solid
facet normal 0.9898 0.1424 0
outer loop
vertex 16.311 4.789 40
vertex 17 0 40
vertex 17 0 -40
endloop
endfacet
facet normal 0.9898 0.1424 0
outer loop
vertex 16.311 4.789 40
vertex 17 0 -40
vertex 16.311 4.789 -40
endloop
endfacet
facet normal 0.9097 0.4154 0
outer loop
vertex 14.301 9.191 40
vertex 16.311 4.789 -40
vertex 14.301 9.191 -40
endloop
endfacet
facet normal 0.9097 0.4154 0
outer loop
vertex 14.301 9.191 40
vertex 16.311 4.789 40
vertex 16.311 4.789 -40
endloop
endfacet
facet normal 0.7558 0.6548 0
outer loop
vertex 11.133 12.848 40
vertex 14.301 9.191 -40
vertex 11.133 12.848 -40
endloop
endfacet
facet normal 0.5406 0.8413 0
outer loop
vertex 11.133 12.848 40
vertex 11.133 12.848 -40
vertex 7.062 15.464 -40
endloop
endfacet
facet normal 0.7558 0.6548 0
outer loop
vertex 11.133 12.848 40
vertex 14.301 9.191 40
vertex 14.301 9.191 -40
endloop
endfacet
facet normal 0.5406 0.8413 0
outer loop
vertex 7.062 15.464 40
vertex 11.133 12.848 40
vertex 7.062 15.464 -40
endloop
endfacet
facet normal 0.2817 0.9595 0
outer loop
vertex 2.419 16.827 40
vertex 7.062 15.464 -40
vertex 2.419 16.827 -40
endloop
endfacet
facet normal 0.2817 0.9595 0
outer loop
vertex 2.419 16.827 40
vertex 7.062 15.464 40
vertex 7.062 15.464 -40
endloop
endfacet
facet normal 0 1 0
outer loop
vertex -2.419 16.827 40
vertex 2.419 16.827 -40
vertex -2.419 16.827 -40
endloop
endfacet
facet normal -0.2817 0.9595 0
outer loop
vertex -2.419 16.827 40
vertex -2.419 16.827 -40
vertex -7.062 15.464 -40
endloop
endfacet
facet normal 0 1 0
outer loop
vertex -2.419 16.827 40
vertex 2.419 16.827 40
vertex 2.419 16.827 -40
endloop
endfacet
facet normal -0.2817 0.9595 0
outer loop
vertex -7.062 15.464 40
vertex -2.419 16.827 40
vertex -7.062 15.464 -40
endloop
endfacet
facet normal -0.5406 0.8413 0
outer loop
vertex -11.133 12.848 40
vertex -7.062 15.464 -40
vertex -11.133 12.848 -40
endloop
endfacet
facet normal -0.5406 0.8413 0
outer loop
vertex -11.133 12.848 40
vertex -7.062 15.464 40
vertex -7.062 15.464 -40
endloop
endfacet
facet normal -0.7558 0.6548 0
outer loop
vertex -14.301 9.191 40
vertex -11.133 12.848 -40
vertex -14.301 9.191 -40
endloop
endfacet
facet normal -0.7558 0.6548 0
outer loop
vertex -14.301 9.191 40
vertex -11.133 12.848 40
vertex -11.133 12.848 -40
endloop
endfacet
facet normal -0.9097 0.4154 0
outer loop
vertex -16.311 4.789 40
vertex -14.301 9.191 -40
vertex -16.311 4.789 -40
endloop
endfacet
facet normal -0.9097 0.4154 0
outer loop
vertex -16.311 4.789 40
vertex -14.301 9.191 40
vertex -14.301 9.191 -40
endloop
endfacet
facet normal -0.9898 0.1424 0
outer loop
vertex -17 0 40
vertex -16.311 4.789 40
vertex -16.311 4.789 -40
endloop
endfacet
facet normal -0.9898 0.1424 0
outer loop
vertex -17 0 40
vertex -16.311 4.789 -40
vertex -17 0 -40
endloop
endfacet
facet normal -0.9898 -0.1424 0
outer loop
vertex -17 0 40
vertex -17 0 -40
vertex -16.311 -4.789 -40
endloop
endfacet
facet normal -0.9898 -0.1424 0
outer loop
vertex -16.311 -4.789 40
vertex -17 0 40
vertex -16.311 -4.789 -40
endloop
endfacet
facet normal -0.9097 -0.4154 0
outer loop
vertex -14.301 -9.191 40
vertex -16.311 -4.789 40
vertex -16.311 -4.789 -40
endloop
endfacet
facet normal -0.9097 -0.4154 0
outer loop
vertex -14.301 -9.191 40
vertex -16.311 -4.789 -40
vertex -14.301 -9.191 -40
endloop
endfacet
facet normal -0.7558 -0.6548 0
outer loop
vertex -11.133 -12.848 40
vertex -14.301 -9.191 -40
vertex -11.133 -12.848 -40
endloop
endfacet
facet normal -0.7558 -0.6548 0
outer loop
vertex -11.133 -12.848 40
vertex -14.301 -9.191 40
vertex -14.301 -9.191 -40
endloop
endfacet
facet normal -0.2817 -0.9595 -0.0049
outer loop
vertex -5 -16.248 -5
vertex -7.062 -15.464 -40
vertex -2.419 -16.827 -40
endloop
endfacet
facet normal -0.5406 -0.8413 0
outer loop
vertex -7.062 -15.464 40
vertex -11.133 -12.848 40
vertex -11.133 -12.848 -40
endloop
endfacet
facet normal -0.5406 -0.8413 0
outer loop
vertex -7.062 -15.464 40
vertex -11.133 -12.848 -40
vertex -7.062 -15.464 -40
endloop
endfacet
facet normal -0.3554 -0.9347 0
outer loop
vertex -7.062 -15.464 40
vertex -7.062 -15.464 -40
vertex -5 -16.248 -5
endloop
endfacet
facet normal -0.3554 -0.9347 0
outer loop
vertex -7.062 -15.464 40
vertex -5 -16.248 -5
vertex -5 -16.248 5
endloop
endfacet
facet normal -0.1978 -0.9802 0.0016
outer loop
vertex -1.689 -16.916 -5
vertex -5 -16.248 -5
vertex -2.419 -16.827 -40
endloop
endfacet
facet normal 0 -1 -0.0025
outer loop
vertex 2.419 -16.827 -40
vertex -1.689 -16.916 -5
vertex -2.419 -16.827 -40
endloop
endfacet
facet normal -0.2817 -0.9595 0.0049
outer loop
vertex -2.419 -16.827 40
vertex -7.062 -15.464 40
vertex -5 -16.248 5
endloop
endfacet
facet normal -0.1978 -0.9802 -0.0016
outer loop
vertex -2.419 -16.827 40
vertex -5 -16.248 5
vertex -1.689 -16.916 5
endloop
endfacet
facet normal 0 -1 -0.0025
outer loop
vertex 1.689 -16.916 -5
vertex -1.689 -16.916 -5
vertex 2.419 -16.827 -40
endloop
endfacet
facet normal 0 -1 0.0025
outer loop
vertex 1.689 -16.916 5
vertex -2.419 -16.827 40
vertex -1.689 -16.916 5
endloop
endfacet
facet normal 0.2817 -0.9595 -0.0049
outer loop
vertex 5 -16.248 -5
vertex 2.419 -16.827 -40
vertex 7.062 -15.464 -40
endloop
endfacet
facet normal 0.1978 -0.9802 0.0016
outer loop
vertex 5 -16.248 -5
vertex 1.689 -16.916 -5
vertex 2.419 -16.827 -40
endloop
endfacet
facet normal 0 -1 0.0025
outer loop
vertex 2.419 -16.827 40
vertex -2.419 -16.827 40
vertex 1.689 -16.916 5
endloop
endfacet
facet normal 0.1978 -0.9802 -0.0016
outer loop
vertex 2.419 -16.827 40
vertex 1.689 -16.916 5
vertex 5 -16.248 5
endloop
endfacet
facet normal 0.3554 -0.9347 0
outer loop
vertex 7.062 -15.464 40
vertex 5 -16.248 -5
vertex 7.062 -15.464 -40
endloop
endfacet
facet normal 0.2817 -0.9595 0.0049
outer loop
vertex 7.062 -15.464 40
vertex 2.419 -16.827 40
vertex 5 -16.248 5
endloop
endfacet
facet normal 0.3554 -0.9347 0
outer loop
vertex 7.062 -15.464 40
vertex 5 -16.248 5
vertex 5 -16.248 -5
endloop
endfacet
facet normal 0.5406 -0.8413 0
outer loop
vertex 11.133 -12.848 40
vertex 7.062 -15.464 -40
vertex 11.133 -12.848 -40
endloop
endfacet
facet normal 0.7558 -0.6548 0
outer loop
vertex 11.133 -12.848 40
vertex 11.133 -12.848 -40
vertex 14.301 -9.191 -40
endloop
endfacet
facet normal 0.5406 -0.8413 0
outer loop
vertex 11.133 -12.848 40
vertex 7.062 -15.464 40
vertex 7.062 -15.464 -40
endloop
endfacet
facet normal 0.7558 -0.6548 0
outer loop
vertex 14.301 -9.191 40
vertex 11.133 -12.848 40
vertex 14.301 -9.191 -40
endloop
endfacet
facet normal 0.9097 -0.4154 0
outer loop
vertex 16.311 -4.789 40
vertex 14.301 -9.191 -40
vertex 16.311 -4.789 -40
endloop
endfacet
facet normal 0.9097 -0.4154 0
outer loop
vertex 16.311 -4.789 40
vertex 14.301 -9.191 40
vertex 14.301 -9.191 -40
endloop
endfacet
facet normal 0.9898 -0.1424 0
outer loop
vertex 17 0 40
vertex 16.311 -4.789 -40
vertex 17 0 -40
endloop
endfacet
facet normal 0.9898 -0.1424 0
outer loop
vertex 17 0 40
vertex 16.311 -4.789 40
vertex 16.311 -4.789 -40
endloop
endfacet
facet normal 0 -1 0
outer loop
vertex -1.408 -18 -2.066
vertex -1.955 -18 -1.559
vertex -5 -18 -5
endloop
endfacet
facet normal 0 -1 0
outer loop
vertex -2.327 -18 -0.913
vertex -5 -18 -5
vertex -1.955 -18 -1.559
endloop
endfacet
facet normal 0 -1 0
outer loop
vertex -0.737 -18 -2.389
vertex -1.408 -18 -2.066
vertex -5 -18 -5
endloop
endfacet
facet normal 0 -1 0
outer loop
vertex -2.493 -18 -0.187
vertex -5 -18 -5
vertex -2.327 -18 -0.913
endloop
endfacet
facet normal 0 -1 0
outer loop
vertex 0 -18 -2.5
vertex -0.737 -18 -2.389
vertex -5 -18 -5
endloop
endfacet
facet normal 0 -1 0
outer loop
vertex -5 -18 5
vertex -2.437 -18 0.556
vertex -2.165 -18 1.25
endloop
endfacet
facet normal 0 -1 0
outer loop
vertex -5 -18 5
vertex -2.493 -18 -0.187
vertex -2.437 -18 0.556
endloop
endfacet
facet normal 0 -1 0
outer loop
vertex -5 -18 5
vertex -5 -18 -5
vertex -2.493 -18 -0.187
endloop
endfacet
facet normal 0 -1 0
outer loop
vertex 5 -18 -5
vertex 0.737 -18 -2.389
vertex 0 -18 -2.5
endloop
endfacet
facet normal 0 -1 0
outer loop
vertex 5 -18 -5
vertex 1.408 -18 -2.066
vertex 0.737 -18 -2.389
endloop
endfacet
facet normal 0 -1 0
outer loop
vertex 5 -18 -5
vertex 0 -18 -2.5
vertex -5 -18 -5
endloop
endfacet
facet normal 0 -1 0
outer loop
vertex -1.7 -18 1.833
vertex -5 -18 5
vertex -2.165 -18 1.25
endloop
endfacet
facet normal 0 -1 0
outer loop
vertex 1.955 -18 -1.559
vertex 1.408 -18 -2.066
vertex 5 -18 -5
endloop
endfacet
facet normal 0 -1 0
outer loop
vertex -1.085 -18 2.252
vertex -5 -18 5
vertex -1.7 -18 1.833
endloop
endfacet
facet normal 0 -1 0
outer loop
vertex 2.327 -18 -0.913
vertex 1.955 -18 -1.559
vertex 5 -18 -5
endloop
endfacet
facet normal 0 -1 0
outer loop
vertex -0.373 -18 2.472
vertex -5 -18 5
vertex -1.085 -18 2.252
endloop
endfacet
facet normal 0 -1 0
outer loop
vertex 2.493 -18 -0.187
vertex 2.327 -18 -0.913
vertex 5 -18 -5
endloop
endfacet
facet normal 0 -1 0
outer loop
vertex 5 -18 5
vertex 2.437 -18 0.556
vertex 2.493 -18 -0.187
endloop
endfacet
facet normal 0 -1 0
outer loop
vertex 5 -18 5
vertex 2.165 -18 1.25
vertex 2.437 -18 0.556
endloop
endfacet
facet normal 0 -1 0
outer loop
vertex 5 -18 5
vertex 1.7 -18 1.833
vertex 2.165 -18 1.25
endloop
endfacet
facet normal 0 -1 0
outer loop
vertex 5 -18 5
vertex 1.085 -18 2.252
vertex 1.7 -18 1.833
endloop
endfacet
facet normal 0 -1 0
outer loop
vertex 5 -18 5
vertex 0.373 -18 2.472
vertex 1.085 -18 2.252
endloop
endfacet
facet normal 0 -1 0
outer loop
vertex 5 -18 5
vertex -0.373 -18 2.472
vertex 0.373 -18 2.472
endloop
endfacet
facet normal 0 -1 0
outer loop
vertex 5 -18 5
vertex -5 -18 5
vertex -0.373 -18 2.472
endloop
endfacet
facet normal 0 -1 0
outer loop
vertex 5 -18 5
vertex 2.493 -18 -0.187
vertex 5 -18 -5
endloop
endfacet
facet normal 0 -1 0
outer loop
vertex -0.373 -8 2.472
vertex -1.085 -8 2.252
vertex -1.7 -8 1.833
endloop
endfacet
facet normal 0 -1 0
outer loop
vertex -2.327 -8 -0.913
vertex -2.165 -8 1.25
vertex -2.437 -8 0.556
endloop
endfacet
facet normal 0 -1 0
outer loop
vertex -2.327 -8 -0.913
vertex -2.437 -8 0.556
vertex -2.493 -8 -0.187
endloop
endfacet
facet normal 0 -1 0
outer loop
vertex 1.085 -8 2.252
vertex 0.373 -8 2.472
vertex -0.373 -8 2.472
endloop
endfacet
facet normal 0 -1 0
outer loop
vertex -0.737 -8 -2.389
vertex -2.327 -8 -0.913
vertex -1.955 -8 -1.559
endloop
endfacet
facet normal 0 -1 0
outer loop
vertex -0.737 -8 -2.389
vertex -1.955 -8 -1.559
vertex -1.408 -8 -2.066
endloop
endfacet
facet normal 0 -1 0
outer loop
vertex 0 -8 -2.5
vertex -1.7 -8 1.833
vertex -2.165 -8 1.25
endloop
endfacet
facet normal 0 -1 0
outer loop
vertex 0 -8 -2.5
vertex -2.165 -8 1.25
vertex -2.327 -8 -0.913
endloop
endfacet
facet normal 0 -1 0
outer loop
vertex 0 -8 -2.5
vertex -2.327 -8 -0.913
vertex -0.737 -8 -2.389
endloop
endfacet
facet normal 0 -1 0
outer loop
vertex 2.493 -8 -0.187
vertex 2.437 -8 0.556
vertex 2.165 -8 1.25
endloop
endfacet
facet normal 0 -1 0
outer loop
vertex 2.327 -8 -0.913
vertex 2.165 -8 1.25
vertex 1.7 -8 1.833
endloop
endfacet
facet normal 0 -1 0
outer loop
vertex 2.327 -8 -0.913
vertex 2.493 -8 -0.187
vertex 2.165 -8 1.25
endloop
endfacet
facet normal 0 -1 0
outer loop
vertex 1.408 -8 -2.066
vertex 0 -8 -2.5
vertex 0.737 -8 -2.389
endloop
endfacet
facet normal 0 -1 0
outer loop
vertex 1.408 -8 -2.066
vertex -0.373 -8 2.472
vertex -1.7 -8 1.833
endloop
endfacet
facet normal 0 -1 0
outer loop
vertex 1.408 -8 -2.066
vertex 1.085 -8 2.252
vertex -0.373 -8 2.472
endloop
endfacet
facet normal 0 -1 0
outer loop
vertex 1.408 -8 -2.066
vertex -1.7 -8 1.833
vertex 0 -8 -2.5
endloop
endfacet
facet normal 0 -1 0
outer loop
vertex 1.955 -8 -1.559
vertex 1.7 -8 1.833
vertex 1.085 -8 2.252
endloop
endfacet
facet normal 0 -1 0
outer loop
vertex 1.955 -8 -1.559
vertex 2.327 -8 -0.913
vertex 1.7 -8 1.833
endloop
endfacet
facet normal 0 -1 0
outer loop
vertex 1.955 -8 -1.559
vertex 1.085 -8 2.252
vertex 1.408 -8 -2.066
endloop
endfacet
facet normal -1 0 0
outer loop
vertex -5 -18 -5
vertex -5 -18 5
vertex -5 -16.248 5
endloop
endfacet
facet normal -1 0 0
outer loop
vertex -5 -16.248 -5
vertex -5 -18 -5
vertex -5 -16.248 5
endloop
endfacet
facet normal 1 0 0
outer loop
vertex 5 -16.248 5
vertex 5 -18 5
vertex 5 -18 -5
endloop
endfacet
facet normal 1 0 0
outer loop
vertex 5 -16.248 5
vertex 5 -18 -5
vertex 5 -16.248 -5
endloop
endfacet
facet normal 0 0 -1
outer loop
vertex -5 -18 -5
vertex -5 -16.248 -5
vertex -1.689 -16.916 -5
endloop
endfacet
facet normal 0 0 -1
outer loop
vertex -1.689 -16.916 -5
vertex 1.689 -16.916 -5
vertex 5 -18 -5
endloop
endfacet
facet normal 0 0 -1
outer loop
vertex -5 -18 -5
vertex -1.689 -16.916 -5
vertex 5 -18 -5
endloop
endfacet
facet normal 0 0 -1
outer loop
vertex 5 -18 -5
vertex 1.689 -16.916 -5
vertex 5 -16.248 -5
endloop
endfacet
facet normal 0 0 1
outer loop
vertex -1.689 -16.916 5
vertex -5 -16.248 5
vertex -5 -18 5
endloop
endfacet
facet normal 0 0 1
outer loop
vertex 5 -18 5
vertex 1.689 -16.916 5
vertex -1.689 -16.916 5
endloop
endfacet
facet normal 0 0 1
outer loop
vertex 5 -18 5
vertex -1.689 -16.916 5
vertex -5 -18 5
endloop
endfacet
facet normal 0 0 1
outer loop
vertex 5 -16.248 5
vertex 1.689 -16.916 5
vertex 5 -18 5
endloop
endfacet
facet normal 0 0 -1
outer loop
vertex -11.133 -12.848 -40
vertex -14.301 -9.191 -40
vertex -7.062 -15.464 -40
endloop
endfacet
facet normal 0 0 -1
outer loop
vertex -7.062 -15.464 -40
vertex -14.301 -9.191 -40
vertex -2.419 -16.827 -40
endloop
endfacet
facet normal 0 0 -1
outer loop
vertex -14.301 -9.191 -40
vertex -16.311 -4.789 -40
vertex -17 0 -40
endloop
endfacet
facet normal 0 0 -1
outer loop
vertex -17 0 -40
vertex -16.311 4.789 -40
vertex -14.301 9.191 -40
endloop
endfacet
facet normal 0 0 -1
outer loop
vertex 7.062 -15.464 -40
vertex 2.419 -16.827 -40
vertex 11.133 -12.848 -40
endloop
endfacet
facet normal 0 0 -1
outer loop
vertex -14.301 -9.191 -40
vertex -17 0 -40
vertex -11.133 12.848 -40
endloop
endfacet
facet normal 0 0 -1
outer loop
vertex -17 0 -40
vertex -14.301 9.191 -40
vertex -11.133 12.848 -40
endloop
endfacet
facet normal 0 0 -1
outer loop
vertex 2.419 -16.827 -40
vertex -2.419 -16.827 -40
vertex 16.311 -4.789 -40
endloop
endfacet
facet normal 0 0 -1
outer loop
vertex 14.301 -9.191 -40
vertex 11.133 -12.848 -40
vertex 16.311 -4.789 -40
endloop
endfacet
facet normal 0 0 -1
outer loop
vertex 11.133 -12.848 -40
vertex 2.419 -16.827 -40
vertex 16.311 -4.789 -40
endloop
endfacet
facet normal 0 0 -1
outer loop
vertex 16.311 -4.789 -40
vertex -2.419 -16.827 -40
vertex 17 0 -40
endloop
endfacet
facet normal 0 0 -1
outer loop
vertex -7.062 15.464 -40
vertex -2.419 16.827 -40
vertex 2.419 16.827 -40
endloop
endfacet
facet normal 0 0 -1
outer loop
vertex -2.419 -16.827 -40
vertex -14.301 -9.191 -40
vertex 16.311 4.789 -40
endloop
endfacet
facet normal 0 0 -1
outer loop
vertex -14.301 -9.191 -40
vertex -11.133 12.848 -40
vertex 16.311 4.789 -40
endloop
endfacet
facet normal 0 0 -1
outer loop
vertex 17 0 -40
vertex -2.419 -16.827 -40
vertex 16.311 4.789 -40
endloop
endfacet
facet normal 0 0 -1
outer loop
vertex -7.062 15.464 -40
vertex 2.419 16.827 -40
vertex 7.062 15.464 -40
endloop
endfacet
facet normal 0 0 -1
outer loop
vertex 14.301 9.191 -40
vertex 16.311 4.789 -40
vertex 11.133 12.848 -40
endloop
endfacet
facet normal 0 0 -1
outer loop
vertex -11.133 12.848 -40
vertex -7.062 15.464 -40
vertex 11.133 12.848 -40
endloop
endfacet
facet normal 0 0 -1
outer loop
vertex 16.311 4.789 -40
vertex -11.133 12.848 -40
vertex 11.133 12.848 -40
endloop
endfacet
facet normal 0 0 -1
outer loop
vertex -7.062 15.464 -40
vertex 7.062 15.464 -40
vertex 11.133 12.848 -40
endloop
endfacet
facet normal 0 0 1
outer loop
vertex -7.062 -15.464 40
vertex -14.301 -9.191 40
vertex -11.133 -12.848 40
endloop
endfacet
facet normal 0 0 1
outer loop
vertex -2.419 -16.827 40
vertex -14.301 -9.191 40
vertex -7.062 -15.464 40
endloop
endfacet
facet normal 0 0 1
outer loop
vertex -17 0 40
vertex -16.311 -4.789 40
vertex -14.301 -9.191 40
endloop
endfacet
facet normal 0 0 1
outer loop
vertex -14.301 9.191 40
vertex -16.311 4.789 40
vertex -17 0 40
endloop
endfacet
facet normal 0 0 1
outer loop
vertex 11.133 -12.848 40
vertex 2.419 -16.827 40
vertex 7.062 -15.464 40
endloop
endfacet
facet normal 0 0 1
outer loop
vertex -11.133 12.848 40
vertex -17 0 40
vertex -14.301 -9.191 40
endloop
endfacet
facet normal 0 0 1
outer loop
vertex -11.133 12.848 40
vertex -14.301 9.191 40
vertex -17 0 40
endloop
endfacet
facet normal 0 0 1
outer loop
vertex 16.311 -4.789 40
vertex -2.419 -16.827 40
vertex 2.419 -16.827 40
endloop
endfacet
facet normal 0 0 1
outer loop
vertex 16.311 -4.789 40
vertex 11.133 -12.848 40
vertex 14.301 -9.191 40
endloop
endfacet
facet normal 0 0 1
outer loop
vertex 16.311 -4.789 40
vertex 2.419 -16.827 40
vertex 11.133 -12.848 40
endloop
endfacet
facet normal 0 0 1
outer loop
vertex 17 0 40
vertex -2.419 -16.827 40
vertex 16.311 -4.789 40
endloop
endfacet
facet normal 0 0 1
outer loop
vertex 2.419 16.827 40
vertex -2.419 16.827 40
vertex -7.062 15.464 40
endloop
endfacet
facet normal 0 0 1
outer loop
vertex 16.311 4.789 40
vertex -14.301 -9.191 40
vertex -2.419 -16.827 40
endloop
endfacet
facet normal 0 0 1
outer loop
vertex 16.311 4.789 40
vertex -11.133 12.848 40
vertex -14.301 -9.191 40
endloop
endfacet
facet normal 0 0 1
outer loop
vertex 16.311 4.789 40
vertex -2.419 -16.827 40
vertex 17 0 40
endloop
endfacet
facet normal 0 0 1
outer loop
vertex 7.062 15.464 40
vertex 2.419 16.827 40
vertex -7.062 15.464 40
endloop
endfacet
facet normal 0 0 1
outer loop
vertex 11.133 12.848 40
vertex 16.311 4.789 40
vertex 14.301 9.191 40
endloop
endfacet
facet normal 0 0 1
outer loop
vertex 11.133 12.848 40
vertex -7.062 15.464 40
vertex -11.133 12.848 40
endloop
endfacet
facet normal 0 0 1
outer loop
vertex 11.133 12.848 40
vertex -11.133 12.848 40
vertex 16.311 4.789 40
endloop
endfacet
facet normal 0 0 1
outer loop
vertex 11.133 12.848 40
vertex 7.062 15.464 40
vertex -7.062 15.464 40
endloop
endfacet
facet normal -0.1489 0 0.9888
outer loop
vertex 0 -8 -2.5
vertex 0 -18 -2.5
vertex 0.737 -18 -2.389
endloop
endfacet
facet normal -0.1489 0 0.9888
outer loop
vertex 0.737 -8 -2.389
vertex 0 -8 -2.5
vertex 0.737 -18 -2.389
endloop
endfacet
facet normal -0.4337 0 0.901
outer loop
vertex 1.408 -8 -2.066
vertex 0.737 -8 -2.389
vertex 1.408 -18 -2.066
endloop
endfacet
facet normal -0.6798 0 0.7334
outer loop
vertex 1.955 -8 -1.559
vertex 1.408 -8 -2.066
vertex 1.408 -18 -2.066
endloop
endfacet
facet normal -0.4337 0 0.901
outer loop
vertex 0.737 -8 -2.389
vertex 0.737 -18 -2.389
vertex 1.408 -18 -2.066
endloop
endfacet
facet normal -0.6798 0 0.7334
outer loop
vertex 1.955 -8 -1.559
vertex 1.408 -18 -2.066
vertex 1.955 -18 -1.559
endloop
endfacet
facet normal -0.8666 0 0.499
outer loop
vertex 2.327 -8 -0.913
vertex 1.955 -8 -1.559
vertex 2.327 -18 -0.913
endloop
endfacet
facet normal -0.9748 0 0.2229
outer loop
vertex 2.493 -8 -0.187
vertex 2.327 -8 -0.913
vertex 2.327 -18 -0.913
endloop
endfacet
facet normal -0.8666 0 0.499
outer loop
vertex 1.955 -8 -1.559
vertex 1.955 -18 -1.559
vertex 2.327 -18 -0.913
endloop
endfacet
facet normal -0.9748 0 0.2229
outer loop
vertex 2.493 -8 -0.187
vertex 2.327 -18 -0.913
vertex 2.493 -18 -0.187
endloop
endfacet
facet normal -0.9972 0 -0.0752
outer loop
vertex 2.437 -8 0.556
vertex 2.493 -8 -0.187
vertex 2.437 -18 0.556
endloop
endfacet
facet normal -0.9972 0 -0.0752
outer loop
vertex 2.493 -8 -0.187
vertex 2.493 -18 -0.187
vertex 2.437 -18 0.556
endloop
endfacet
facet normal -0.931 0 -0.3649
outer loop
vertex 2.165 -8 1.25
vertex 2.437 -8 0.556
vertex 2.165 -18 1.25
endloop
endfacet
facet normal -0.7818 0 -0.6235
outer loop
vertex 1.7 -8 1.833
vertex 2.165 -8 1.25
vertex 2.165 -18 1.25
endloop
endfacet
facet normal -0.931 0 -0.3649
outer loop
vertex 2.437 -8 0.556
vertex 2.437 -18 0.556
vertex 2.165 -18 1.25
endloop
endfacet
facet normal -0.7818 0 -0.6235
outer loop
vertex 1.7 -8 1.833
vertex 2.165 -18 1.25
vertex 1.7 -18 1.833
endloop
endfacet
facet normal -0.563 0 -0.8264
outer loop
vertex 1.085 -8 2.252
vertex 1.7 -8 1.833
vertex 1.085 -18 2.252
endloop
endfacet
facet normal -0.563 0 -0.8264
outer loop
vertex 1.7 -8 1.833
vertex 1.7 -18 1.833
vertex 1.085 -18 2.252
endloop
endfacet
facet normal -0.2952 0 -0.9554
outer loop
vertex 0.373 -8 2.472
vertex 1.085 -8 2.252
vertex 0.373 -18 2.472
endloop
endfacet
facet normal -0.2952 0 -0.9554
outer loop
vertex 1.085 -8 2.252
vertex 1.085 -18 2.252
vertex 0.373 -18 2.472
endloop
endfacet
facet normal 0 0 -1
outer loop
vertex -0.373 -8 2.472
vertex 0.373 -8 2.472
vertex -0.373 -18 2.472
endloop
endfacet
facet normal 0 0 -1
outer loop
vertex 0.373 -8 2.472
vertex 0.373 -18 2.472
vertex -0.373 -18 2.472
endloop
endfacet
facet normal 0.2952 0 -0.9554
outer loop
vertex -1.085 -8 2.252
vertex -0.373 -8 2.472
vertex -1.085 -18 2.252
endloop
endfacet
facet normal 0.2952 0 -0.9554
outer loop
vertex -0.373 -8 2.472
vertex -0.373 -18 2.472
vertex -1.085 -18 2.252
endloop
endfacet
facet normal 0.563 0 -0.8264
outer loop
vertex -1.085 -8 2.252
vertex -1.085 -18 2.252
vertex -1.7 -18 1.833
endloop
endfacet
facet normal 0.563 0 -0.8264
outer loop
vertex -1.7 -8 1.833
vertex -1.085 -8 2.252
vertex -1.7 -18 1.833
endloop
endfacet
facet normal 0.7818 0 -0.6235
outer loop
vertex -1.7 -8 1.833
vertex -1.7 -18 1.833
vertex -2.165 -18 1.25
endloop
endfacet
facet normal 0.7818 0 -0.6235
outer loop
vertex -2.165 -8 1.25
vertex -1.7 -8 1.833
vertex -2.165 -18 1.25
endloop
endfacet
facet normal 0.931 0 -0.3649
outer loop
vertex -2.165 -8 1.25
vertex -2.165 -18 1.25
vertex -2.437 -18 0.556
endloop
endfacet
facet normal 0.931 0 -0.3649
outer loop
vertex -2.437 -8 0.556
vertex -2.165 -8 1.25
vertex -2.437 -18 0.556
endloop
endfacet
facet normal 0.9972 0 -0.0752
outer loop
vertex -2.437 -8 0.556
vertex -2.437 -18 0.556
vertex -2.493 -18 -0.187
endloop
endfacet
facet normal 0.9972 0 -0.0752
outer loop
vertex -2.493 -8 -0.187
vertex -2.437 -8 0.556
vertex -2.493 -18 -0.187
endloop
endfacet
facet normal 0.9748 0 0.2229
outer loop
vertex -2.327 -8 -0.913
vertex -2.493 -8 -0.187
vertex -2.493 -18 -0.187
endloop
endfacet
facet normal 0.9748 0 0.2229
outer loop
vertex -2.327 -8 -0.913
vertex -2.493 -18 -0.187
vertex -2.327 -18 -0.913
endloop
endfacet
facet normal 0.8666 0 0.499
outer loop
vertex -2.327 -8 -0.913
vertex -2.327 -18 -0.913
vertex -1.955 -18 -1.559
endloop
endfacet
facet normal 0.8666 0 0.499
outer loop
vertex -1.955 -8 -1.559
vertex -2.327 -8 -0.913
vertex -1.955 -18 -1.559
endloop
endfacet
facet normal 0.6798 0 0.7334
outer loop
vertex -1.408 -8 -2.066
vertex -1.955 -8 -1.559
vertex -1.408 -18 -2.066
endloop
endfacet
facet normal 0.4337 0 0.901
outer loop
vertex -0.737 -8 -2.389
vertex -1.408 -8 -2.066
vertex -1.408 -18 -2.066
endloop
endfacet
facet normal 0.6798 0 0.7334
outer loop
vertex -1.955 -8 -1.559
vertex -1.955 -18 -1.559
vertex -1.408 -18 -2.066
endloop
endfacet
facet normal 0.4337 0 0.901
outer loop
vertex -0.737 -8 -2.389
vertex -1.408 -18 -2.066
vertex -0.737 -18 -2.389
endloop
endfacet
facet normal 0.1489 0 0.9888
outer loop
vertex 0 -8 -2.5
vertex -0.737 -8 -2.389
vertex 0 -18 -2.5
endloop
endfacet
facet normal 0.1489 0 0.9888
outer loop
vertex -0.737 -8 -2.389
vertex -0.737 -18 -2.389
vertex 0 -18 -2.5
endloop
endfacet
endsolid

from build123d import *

# Parameters (mm, degrees)
SKETCH1_R           = 17
BOSS_EXTRUDE1_DEPTH = 40
SKETCH2_W           = 10
SKETCH2_H           = 2
BOSS_EXTRUDE2_DEPTH = 5
SKETCH3_R           = 2.5
CUT_EXTRUDE1_DEPTH  = 10


with BuildPart() as part:
    # Sketch1 → Boss-Extrude1 (new, symmetric)
    with BuildSketch(Plane.XY):
        Circle(SKETCH1_R)
    extrude(amount=BOSS_EXTRUDE1_DEPTH, both=True)

    # Sketch2 → Boss-Extrude2 (add, symmetric)
    with BuildSketch(Plane.XY):
        with Locations((0, -17)):
            Rectangle(SKETCH2_W, SKETCH2_H)
    extrude(amount=BOSS_EXTRUDE2_DEPTH, both=True)

    # Sketch3 → Cut-Extrude1 (cut)
    with BuildSketch(Plane.XZ.offset(18)):
        with Locations(Location((0, 0, 0), (0, 0, 270))):
            Circle(SKETCH3_R)
    extrude(amount=-CUT_EXTRUDE1_DEPTH, mode=Mode.SUBTRACT)


solid = part.part
